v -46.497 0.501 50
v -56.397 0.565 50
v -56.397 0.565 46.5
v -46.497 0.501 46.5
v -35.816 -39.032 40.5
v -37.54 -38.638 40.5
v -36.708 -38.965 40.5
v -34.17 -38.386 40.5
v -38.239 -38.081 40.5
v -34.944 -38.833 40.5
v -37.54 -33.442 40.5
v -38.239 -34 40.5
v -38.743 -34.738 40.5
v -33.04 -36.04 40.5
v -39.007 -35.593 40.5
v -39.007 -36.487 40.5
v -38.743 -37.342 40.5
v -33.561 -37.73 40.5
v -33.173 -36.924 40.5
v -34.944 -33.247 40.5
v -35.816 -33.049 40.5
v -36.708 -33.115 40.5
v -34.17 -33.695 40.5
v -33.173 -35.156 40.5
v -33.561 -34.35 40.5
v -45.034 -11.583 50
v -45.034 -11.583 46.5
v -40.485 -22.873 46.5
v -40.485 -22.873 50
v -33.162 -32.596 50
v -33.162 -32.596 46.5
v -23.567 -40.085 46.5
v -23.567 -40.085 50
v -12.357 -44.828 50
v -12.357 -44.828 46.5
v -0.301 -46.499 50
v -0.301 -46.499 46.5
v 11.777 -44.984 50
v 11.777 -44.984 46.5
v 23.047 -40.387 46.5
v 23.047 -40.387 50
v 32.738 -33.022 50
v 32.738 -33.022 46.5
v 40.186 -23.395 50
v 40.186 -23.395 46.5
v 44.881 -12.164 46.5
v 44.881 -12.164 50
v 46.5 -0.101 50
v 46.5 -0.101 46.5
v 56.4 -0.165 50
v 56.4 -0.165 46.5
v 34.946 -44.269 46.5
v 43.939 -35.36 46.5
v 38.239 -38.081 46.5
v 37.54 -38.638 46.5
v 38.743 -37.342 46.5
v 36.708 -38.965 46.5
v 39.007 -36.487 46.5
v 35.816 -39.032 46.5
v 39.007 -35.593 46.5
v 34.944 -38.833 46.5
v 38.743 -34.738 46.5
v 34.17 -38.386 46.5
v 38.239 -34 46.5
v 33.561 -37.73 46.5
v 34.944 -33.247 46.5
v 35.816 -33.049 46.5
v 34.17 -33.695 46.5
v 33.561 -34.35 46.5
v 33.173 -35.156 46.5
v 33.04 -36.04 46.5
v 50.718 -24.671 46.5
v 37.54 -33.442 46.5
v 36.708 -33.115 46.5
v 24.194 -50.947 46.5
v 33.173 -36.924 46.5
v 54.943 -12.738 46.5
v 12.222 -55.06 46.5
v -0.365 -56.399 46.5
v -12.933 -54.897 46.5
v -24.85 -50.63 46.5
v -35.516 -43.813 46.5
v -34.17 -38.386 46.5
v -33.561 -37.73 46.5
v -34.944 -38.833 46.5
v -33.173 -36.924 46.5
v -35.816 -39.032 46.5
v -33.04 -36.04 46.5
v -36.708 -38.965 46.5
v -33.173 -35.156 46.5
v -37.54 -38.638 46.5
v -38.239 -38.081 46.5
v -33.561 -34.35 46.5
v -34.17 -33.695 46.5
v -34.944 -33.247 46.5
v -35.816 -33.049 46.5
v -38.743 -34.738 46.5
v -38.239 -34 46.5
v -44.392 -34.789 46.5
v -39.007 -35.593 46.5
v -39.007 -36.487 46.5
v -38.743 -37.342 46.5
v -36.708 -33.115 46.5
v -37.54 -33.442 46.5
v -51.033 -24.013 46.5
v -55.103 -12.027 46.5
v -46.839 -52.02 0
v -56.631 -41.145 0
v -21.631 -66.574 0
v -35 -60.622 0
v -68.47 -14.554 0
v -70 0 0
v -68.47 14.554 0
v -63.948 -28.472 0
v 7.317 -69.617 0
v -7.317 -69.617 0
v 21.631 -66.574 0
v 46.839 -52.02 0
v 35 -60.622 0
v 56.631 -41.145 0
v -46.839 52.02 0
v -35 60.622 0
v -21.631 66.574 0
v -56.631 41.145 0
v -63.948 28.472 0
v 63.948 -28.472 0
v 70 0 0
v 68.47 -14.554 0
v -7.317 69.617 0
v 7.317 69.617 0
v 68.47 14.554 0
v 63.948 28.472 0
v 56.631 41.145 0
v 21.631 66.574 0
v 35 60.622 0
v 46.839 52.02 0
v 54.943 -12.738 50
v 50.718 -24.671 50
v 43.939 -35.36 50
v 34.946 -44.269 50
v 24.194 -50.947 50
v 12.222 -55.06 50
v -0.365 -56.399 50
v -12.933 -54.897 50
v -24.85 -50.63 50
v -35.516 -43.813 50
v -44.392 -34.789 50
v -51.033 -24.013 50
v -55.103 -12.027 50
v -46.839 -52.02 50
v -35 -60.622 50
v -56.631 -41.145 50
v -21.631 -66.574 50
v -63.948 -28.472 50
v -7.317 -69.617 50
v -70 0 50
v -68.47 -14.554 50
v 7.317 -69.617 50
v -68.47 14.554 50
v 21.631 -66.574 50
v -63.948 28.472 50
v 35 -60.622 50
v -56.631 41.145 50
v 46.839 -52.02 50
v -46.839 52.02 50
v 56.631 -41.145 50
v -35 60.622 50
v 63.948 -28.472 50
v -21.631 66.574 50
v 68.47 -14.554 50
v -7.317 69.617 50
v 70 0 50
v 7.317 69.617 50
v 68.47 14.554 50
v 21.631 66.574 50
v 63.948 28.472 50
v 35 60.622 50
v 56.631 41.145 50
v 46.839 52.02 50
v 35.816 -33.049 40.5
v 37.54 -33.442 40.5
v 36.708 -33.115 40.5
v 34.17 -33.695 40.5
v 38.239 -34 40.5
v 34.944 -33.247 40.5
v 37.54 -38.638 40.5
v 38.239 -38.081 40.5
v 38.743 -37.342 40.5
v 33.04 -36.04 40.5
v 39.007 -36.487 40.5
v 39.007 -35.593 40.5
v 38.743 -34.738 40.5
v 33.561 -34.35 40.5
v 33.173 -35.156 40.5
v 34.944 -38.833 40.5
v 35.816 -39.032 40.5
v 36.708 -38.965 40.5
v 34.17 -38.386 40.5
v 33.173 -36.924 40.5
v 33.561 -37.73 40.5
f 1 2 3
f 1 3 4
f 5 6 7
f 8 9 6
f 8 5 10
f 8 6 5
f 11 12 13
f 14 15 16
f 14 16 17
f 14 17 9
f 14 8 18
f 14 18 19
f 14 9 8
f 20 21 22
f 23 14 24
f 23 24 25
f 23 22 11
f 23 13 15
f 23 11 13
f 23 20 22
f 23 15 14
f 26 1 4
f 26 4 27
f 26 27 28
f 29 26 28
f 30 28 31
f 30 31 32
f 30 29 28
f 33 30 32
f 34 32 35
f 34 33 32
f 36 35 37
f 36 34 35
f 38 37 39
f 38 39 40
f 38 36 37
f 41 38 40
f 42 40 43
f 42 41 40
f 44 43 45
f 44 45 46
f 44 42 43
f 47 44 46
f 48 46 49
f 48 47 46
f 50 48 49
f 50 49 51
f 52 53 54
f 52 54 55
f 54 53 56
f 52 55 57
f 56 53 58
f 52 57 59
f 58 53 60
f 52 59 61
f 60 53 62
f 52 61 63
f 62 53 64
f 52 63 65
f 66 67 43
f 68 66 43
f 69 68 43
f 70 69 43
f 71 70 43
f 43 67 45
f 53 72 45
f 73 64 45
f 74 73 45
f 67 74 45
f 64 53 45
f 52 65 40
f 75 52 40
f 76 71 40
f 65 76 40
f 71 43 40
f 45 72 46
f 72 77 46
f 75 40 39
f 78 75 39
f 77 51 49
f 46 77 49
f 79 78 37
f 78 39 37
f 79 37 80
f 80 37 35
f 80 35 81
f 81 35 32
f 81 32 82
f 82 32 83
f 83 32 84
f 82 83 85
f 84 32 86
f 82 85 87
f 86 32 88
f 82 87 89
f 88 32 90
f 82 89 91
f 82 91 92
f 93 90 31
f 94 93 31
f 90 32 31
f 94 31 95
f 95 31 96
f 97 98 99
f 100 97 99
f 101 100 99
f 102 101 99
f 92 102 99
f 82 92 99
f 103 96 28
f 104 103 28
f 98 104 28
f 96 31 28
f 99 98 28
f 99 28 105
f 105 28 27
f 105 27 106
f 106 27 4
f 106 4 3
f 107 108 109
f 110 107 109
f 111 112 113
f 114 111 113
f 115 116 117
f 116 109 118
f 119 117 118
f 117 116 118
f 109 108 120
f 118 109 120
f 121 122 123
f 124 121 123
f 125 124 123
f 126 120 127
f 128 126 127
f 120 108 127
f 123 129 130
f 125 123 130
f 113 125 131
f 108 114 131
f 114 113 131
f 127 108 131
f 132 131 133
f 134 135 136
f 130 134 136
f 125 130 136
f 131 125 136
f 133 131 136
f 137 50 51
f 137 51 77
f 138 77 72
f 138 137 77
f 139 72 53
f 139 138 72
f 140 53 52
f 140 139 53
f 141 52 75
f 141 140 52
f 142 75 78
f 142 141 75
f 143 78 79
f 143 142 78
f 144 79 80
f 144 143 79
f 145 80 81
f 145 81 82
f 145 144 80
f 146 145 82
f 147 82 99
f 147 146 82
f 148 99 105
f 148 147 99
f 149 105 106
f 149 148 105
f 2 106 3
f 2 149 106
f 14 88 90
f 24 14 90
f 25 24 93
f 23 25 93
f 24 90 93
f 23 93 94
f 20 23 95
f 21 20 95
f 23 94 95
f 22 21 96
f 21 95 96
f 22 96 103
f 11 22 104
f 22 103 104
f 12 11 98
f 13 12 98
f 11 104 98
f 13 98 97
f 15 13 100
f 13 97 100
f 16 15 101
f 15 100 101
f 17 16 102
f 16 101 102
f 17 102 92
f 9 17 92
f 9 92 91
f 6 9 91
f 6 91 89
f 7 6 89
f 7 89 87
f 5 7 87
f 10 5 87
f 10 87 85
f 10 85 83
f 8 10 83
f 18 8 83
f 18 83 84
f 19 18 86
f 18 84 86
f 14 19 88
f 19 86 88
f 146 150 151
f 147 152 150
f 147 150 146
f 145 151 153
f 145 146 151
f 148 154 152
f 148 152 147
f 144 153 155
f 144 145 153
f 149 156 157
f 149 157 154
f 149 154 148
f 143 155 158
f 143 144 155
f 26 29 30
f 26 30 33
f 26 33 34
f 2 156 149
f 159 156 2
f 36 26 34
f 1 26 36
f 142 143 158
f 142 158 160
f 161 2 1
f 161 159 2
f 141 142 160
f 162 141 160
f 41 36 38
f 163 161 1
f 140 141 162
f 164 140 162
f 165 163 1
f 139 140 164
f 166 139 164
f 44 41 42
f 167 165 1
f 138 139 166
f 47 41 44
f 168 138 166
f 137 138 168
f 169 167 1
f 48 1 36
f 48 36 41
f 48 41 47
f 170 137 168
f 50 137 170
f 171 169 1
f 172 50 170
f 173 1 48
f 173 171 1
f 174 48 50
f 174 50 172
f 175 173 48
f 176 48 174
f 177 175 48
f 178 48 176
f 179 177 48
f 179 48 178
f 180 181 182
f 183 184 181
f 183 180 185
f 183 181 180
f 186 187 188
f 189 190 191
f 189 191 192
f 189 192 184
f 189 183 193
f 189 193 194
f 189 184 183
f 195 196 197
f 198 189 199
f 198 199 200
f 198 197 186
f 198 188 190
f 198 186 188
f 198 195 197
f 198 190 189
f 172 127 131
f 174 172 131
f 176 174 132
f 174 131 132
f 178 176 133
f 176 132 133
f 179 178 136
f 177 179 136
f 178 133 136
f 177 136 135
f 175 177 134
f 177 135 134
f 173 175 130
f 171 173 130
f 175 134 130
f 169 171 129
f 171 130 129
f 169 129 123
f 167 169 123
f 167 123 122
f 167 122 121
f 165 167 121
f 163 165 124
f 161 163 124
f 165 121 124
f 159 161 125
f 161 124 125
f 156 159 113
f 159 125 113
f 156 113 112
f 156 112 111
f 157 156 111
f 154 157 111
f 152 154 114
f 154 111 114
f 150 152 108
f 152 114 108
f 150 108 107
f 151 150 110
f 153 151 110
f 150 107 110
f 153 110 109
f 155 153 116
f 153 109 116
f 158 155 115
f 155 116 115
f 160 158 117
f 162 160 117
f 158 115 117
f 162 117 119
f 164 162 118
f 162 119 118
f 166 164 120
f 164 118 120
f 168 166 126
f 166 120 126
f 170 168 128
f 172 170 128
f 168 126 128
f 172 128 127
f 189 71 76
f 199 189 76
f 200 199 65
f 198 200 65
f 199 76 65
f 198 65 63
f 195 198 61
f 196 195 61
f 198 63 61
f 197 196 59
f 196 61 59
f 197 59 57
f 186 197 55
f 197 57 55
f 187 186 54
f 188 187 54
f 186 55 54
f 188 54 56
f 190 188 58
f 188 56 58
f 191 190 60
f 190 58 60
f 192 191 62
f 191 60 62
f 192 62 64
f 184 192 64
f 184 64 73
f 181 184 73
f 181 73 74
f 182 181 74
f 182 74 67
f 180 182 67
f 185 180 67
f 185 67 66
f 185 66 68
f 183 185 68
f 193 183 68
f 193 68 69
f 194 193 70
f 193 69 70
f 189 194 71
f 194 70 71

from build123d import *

# Parameters (mm, degrees)
SKETCH_1_R          = 70
EXTRUDE_1_DEPTH     = 50
CUT_EXTRUDE_1_DEPTH = 3.5
SKETCH_4_R          = 3
CUT_EXTRUDE_2_DEPTH = 6


with BuildPart() as part:
    # 스케치1 → 보스-돌출1 (new body)
    with BuildSketch(Plane.XY):
        Circle(SKETCH_1_R)
    extrude(amount=EXTRUDE_1_DEPTH)

    # 스케치3 → 컷-돌출1 (cut)
    with BuildSketch(Plane.XY.offset(50)):
        with BuildLine():
            Line((-56.397174638, 0.564528852), (-46.497305932, 0.500540781))
            ThreePointArc((-46.497305932, 0.500540781), (-0.300547739, -46.499028711), (46.499891289, -0.100549136))
            Line((46.499891289, -0.100549136), (56.399759995, -0.164537207))
            ThreePointArc((56.399759995, -0.164537207), (-0.364535322, -56.39882192), (-56.397174638, 0.564528852))
        make_face()
    extrude(amount=-CUT_EXTRUDE_1_DEPTH, mode=Mode.SUBTRACT)

    # 스케치4 → 컷-돌출2 (cut)
    with BuildSketch(Plane.XY.offset(46.5)):
        with Locations((-36.040115251, -36.040115251)):
            Circle(SKETCH_4_R)
        with Locations(Location((36.040115251, -36.040115251, 0), (0, 0, 180))):
            Circle(SKETCH_4_R)
    extrude(amount=-CUT_EXTRUDE_2_DEPTH, mode=Mode.SUBTRACT)


solid = part.part
